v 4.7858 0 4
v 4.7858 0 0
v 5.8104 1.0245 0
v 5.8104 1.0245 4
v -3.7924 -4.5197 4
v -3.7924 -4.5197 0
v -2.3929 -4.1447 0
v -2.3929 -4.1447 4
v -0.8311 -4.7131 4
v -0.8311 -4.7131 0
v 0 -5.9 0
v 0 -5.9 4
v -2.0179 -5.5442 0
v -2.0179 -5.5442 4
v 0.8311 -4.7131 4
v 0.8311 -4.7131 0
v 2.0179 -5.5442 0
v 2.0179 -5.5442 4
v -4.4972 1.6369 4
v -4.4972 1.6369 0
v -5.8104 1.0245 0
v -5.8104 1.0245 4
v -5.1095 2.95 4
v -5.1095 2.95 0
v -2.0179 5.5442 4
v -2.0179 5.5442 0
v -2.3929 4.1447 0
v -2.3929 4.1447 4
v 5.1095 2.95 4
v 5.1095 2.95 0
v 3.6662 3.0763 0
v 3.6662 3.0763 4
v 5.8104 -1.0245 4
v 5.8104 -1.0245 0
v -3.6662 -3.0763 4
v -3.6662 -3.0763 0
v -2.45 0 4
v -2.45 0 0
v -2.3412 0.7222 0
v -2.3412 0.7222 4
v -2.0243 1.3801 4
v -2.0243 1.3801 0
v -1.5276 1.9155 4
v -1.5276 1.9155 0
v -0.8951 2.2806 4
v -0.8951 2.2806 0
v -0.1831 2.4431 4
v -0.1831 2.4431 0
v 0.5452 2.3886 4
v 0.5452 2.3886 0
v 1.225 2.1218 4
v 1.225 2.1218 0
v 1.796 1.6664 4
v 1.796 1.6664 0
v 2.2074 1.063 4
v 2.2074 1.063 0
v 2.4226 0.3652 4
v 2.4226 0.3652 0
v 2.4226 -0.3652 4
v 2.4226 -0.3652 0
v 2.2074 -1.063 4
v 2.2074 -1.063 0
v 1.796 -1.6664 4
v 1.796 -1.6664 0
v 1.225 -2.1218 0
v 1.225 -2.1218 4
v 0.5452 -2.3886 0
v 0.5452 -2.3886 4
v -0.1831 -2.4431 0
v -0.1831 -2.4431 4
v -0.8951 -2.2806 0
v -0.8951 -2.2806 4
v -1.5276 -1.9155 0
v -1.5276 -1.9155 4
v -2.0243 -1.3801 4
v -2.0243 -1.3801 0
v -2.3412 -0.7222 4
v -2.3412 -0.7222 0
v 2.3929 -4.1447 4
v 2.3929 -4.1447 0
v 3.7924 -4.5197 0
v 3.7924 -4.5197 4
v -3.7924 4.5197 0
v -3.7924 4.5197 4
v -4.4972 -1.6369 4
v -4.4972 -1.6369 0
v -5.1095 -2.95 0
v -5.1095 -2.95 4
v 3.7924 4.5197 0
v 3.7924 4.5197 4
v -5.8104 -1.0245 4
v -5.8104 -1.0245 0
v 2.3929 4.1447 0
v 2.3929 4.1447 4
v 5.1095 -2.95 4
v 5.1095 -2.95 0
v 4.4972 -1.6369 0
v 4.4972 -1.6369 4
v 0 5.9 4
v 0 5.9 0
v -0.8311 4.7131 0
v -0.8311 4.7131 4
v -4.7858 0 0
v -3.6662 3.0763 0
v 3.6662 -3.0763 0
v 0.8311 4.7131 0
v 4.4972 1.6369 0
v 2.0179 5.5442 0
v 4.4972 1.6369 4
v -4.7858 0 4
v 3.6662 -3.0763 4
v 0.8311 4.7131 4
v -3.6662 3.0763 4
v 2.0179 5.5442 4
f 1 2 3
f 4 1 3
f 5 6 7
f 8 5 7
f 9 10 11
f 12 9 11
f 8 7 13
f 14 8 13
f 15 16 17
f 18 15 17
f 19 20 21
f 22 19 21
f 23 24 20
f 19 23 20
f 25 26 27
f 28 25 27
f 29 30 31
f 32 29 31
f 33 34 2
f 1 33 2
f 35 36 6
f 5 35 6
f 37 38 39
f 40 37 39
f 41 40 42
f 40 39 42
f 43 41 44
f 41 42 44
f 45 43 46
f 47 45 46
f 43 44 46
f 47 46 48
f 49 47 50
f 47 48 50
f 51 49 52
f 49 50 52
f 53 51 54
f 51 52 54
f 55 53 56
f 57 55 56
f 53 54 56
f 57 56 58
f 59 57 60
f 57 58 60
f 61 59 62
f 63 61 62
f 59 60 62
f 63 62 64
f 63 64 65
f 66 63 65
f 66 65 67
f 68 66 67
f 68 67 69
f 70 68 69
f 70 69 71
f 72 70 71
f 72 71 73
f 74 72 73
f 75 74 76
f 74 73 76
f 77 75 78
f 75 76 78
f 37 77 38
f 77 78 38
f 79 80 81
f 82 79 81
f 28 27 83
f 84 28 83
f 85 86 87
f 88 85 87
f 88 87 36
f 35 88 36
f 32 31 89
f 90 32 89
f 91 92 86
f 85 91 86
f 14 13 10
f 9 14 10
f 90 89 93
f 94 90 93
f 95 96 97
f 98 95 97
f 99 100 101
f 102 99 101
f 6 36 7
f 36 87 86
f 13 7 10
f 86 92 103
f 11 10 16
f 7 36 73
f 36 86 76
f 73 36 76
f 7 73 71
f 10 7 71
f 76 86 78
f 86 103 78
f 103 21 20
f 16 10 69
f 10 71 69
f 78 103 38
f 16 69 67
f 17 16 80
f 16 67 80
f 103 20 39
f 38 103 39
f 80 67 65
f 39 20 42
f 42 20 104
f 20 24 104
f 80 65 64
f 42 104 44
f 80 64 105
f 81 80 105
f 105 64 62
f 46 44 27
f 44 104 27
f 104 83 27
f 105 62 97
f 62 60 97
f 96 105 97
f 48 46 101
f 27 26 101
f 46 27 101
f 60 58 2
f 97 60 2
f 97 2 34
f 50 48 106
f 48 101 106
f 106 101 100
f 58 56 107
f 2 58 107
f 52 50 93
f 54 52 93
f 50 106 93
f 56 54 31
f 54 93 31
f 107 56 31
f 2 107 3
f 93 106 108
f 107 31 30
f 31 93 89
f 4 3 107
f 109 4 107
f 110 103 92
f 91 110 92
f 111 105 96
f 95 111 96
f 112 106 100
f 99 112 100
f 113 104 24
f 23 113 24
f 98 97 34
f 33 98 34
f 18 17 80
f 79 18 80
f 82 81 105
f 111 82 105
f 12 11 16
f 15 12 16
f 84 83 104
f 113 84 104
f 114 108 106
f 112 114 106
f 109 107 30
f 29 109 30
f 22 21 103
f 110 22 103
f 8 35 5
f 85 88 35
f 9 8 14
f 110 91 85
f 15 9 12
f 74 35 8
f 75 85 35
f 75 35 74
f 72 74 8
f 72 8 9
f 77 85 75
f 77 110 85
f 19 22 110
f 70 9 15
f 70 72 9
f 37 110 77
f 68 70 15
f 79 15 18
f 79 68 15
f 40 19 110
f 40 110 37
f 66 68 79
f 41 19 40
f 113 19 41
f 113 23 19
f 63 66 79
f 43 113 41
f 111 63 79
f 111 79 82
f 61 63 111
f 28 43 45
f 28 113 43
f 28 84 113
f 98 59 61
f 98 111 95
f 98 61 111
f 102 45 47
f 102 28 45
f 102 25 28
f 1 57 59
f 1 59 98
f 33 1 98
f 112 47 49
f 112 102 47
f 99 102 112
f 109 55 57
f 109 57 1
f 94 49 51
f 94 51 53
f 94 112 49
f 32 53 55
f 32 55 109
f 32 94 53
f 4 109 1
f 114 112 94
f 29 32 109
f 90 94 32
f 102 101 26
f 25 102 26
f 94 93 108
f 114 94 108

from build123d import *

# Parameters (mm, degrees)
SKIZZE1_R                       = 5.9
AUFSATZ_LINEAR_AUSTRAGEN1_DEPTH = 4
SKIZZE2_R                       = 2.45
SCHNITT_LINEAR_AUSTRAGEN1_DEPTH = 4
SKIZZE3_R                       = 6.915910243
SCHNITT_LINEAR_AUSTRAGEN3_DEPTH = 6


with BuildPart() as part:
    # Skizze1 → Aufsatz-Linear austragen1 (new body)
    with BuildSketch(Plane.XY):
        Circle(SKIZZE1_R)
    extrude(amount=AUFSATZ_LINEAR_AUSTRAGEN1_DEPTH)

    # Skizze2 → Schnitt-Linear austragen1 (cut)
    with BuildSketch(Plane(origin=(0, 0, 0), x_dir=(-1, 0, 0), z_dir=(0, 0, -1))):
        Circle(SKIZZE2_R)
    extrude(amount=-SCHNITT_LINEAR_AUSTRAGEN1_DEPTH, mode=Mode.SUBTRACT)

    # Skizze3 → Schnitt-Linear austragen3 (cut)
    with BuildSketch(Plane(origin=(0, 0, 0), x_dir=(-1, 0, 0), z_dir=(0, 0, -1))):
        Circle(SKIZZE3_R)
        Polygon((0, 5.9), (0.831052654, 4.713133809), (2.017918846, 5.544186463), (2.392920747, 4.144660313), (3.792446897, 4.519662214), (3.666167283, 3.076279615), (5.109549882, 2.95), (4.497219937, 1.636854194), (5.810365743, 1.024524248), (4.785841495, 0), (5.810365743, -1.024524248), (4.497219937, -1.636854194), (5.109549882, -2.95), (3.666167283, -3.076279615), (3.792446897, -4.519662214), (2.392920747, -4.144660313), (2.017918846, -5.544186463), (0.831052654, -4.713133809), (0, -5.9), (-0.831052654, -4.713133809), (-2.017918846, -5.544186463), (-2.392920747, -4.144660313), (-3.792446897, -4.519662214), (-3.666167283, -3.076279615), (-5.109549882, -2.95), (-4.497219937, -1.636854194), (-5.810365743, -1.024524248), (-4.785841495, 0), (-5.810365743, 1.024524248), (-4.497219937, 1.636854194), (-5.109549882, 2.95), (-3.666167283, 3.076279615), (-3.792446897, 4.519662214), (-2.392920747, 4.144660313), (-2.017918846, 5.544186463), (-0.831052654, 4.713133809), align=None, mode=Mode.SUBTRACT)
    extrude(amount=-SCHNITT_LINEAR_AUSTRAGEN3_DEPTH, mode=Mode.SUBTRACT)


solid = part.part
